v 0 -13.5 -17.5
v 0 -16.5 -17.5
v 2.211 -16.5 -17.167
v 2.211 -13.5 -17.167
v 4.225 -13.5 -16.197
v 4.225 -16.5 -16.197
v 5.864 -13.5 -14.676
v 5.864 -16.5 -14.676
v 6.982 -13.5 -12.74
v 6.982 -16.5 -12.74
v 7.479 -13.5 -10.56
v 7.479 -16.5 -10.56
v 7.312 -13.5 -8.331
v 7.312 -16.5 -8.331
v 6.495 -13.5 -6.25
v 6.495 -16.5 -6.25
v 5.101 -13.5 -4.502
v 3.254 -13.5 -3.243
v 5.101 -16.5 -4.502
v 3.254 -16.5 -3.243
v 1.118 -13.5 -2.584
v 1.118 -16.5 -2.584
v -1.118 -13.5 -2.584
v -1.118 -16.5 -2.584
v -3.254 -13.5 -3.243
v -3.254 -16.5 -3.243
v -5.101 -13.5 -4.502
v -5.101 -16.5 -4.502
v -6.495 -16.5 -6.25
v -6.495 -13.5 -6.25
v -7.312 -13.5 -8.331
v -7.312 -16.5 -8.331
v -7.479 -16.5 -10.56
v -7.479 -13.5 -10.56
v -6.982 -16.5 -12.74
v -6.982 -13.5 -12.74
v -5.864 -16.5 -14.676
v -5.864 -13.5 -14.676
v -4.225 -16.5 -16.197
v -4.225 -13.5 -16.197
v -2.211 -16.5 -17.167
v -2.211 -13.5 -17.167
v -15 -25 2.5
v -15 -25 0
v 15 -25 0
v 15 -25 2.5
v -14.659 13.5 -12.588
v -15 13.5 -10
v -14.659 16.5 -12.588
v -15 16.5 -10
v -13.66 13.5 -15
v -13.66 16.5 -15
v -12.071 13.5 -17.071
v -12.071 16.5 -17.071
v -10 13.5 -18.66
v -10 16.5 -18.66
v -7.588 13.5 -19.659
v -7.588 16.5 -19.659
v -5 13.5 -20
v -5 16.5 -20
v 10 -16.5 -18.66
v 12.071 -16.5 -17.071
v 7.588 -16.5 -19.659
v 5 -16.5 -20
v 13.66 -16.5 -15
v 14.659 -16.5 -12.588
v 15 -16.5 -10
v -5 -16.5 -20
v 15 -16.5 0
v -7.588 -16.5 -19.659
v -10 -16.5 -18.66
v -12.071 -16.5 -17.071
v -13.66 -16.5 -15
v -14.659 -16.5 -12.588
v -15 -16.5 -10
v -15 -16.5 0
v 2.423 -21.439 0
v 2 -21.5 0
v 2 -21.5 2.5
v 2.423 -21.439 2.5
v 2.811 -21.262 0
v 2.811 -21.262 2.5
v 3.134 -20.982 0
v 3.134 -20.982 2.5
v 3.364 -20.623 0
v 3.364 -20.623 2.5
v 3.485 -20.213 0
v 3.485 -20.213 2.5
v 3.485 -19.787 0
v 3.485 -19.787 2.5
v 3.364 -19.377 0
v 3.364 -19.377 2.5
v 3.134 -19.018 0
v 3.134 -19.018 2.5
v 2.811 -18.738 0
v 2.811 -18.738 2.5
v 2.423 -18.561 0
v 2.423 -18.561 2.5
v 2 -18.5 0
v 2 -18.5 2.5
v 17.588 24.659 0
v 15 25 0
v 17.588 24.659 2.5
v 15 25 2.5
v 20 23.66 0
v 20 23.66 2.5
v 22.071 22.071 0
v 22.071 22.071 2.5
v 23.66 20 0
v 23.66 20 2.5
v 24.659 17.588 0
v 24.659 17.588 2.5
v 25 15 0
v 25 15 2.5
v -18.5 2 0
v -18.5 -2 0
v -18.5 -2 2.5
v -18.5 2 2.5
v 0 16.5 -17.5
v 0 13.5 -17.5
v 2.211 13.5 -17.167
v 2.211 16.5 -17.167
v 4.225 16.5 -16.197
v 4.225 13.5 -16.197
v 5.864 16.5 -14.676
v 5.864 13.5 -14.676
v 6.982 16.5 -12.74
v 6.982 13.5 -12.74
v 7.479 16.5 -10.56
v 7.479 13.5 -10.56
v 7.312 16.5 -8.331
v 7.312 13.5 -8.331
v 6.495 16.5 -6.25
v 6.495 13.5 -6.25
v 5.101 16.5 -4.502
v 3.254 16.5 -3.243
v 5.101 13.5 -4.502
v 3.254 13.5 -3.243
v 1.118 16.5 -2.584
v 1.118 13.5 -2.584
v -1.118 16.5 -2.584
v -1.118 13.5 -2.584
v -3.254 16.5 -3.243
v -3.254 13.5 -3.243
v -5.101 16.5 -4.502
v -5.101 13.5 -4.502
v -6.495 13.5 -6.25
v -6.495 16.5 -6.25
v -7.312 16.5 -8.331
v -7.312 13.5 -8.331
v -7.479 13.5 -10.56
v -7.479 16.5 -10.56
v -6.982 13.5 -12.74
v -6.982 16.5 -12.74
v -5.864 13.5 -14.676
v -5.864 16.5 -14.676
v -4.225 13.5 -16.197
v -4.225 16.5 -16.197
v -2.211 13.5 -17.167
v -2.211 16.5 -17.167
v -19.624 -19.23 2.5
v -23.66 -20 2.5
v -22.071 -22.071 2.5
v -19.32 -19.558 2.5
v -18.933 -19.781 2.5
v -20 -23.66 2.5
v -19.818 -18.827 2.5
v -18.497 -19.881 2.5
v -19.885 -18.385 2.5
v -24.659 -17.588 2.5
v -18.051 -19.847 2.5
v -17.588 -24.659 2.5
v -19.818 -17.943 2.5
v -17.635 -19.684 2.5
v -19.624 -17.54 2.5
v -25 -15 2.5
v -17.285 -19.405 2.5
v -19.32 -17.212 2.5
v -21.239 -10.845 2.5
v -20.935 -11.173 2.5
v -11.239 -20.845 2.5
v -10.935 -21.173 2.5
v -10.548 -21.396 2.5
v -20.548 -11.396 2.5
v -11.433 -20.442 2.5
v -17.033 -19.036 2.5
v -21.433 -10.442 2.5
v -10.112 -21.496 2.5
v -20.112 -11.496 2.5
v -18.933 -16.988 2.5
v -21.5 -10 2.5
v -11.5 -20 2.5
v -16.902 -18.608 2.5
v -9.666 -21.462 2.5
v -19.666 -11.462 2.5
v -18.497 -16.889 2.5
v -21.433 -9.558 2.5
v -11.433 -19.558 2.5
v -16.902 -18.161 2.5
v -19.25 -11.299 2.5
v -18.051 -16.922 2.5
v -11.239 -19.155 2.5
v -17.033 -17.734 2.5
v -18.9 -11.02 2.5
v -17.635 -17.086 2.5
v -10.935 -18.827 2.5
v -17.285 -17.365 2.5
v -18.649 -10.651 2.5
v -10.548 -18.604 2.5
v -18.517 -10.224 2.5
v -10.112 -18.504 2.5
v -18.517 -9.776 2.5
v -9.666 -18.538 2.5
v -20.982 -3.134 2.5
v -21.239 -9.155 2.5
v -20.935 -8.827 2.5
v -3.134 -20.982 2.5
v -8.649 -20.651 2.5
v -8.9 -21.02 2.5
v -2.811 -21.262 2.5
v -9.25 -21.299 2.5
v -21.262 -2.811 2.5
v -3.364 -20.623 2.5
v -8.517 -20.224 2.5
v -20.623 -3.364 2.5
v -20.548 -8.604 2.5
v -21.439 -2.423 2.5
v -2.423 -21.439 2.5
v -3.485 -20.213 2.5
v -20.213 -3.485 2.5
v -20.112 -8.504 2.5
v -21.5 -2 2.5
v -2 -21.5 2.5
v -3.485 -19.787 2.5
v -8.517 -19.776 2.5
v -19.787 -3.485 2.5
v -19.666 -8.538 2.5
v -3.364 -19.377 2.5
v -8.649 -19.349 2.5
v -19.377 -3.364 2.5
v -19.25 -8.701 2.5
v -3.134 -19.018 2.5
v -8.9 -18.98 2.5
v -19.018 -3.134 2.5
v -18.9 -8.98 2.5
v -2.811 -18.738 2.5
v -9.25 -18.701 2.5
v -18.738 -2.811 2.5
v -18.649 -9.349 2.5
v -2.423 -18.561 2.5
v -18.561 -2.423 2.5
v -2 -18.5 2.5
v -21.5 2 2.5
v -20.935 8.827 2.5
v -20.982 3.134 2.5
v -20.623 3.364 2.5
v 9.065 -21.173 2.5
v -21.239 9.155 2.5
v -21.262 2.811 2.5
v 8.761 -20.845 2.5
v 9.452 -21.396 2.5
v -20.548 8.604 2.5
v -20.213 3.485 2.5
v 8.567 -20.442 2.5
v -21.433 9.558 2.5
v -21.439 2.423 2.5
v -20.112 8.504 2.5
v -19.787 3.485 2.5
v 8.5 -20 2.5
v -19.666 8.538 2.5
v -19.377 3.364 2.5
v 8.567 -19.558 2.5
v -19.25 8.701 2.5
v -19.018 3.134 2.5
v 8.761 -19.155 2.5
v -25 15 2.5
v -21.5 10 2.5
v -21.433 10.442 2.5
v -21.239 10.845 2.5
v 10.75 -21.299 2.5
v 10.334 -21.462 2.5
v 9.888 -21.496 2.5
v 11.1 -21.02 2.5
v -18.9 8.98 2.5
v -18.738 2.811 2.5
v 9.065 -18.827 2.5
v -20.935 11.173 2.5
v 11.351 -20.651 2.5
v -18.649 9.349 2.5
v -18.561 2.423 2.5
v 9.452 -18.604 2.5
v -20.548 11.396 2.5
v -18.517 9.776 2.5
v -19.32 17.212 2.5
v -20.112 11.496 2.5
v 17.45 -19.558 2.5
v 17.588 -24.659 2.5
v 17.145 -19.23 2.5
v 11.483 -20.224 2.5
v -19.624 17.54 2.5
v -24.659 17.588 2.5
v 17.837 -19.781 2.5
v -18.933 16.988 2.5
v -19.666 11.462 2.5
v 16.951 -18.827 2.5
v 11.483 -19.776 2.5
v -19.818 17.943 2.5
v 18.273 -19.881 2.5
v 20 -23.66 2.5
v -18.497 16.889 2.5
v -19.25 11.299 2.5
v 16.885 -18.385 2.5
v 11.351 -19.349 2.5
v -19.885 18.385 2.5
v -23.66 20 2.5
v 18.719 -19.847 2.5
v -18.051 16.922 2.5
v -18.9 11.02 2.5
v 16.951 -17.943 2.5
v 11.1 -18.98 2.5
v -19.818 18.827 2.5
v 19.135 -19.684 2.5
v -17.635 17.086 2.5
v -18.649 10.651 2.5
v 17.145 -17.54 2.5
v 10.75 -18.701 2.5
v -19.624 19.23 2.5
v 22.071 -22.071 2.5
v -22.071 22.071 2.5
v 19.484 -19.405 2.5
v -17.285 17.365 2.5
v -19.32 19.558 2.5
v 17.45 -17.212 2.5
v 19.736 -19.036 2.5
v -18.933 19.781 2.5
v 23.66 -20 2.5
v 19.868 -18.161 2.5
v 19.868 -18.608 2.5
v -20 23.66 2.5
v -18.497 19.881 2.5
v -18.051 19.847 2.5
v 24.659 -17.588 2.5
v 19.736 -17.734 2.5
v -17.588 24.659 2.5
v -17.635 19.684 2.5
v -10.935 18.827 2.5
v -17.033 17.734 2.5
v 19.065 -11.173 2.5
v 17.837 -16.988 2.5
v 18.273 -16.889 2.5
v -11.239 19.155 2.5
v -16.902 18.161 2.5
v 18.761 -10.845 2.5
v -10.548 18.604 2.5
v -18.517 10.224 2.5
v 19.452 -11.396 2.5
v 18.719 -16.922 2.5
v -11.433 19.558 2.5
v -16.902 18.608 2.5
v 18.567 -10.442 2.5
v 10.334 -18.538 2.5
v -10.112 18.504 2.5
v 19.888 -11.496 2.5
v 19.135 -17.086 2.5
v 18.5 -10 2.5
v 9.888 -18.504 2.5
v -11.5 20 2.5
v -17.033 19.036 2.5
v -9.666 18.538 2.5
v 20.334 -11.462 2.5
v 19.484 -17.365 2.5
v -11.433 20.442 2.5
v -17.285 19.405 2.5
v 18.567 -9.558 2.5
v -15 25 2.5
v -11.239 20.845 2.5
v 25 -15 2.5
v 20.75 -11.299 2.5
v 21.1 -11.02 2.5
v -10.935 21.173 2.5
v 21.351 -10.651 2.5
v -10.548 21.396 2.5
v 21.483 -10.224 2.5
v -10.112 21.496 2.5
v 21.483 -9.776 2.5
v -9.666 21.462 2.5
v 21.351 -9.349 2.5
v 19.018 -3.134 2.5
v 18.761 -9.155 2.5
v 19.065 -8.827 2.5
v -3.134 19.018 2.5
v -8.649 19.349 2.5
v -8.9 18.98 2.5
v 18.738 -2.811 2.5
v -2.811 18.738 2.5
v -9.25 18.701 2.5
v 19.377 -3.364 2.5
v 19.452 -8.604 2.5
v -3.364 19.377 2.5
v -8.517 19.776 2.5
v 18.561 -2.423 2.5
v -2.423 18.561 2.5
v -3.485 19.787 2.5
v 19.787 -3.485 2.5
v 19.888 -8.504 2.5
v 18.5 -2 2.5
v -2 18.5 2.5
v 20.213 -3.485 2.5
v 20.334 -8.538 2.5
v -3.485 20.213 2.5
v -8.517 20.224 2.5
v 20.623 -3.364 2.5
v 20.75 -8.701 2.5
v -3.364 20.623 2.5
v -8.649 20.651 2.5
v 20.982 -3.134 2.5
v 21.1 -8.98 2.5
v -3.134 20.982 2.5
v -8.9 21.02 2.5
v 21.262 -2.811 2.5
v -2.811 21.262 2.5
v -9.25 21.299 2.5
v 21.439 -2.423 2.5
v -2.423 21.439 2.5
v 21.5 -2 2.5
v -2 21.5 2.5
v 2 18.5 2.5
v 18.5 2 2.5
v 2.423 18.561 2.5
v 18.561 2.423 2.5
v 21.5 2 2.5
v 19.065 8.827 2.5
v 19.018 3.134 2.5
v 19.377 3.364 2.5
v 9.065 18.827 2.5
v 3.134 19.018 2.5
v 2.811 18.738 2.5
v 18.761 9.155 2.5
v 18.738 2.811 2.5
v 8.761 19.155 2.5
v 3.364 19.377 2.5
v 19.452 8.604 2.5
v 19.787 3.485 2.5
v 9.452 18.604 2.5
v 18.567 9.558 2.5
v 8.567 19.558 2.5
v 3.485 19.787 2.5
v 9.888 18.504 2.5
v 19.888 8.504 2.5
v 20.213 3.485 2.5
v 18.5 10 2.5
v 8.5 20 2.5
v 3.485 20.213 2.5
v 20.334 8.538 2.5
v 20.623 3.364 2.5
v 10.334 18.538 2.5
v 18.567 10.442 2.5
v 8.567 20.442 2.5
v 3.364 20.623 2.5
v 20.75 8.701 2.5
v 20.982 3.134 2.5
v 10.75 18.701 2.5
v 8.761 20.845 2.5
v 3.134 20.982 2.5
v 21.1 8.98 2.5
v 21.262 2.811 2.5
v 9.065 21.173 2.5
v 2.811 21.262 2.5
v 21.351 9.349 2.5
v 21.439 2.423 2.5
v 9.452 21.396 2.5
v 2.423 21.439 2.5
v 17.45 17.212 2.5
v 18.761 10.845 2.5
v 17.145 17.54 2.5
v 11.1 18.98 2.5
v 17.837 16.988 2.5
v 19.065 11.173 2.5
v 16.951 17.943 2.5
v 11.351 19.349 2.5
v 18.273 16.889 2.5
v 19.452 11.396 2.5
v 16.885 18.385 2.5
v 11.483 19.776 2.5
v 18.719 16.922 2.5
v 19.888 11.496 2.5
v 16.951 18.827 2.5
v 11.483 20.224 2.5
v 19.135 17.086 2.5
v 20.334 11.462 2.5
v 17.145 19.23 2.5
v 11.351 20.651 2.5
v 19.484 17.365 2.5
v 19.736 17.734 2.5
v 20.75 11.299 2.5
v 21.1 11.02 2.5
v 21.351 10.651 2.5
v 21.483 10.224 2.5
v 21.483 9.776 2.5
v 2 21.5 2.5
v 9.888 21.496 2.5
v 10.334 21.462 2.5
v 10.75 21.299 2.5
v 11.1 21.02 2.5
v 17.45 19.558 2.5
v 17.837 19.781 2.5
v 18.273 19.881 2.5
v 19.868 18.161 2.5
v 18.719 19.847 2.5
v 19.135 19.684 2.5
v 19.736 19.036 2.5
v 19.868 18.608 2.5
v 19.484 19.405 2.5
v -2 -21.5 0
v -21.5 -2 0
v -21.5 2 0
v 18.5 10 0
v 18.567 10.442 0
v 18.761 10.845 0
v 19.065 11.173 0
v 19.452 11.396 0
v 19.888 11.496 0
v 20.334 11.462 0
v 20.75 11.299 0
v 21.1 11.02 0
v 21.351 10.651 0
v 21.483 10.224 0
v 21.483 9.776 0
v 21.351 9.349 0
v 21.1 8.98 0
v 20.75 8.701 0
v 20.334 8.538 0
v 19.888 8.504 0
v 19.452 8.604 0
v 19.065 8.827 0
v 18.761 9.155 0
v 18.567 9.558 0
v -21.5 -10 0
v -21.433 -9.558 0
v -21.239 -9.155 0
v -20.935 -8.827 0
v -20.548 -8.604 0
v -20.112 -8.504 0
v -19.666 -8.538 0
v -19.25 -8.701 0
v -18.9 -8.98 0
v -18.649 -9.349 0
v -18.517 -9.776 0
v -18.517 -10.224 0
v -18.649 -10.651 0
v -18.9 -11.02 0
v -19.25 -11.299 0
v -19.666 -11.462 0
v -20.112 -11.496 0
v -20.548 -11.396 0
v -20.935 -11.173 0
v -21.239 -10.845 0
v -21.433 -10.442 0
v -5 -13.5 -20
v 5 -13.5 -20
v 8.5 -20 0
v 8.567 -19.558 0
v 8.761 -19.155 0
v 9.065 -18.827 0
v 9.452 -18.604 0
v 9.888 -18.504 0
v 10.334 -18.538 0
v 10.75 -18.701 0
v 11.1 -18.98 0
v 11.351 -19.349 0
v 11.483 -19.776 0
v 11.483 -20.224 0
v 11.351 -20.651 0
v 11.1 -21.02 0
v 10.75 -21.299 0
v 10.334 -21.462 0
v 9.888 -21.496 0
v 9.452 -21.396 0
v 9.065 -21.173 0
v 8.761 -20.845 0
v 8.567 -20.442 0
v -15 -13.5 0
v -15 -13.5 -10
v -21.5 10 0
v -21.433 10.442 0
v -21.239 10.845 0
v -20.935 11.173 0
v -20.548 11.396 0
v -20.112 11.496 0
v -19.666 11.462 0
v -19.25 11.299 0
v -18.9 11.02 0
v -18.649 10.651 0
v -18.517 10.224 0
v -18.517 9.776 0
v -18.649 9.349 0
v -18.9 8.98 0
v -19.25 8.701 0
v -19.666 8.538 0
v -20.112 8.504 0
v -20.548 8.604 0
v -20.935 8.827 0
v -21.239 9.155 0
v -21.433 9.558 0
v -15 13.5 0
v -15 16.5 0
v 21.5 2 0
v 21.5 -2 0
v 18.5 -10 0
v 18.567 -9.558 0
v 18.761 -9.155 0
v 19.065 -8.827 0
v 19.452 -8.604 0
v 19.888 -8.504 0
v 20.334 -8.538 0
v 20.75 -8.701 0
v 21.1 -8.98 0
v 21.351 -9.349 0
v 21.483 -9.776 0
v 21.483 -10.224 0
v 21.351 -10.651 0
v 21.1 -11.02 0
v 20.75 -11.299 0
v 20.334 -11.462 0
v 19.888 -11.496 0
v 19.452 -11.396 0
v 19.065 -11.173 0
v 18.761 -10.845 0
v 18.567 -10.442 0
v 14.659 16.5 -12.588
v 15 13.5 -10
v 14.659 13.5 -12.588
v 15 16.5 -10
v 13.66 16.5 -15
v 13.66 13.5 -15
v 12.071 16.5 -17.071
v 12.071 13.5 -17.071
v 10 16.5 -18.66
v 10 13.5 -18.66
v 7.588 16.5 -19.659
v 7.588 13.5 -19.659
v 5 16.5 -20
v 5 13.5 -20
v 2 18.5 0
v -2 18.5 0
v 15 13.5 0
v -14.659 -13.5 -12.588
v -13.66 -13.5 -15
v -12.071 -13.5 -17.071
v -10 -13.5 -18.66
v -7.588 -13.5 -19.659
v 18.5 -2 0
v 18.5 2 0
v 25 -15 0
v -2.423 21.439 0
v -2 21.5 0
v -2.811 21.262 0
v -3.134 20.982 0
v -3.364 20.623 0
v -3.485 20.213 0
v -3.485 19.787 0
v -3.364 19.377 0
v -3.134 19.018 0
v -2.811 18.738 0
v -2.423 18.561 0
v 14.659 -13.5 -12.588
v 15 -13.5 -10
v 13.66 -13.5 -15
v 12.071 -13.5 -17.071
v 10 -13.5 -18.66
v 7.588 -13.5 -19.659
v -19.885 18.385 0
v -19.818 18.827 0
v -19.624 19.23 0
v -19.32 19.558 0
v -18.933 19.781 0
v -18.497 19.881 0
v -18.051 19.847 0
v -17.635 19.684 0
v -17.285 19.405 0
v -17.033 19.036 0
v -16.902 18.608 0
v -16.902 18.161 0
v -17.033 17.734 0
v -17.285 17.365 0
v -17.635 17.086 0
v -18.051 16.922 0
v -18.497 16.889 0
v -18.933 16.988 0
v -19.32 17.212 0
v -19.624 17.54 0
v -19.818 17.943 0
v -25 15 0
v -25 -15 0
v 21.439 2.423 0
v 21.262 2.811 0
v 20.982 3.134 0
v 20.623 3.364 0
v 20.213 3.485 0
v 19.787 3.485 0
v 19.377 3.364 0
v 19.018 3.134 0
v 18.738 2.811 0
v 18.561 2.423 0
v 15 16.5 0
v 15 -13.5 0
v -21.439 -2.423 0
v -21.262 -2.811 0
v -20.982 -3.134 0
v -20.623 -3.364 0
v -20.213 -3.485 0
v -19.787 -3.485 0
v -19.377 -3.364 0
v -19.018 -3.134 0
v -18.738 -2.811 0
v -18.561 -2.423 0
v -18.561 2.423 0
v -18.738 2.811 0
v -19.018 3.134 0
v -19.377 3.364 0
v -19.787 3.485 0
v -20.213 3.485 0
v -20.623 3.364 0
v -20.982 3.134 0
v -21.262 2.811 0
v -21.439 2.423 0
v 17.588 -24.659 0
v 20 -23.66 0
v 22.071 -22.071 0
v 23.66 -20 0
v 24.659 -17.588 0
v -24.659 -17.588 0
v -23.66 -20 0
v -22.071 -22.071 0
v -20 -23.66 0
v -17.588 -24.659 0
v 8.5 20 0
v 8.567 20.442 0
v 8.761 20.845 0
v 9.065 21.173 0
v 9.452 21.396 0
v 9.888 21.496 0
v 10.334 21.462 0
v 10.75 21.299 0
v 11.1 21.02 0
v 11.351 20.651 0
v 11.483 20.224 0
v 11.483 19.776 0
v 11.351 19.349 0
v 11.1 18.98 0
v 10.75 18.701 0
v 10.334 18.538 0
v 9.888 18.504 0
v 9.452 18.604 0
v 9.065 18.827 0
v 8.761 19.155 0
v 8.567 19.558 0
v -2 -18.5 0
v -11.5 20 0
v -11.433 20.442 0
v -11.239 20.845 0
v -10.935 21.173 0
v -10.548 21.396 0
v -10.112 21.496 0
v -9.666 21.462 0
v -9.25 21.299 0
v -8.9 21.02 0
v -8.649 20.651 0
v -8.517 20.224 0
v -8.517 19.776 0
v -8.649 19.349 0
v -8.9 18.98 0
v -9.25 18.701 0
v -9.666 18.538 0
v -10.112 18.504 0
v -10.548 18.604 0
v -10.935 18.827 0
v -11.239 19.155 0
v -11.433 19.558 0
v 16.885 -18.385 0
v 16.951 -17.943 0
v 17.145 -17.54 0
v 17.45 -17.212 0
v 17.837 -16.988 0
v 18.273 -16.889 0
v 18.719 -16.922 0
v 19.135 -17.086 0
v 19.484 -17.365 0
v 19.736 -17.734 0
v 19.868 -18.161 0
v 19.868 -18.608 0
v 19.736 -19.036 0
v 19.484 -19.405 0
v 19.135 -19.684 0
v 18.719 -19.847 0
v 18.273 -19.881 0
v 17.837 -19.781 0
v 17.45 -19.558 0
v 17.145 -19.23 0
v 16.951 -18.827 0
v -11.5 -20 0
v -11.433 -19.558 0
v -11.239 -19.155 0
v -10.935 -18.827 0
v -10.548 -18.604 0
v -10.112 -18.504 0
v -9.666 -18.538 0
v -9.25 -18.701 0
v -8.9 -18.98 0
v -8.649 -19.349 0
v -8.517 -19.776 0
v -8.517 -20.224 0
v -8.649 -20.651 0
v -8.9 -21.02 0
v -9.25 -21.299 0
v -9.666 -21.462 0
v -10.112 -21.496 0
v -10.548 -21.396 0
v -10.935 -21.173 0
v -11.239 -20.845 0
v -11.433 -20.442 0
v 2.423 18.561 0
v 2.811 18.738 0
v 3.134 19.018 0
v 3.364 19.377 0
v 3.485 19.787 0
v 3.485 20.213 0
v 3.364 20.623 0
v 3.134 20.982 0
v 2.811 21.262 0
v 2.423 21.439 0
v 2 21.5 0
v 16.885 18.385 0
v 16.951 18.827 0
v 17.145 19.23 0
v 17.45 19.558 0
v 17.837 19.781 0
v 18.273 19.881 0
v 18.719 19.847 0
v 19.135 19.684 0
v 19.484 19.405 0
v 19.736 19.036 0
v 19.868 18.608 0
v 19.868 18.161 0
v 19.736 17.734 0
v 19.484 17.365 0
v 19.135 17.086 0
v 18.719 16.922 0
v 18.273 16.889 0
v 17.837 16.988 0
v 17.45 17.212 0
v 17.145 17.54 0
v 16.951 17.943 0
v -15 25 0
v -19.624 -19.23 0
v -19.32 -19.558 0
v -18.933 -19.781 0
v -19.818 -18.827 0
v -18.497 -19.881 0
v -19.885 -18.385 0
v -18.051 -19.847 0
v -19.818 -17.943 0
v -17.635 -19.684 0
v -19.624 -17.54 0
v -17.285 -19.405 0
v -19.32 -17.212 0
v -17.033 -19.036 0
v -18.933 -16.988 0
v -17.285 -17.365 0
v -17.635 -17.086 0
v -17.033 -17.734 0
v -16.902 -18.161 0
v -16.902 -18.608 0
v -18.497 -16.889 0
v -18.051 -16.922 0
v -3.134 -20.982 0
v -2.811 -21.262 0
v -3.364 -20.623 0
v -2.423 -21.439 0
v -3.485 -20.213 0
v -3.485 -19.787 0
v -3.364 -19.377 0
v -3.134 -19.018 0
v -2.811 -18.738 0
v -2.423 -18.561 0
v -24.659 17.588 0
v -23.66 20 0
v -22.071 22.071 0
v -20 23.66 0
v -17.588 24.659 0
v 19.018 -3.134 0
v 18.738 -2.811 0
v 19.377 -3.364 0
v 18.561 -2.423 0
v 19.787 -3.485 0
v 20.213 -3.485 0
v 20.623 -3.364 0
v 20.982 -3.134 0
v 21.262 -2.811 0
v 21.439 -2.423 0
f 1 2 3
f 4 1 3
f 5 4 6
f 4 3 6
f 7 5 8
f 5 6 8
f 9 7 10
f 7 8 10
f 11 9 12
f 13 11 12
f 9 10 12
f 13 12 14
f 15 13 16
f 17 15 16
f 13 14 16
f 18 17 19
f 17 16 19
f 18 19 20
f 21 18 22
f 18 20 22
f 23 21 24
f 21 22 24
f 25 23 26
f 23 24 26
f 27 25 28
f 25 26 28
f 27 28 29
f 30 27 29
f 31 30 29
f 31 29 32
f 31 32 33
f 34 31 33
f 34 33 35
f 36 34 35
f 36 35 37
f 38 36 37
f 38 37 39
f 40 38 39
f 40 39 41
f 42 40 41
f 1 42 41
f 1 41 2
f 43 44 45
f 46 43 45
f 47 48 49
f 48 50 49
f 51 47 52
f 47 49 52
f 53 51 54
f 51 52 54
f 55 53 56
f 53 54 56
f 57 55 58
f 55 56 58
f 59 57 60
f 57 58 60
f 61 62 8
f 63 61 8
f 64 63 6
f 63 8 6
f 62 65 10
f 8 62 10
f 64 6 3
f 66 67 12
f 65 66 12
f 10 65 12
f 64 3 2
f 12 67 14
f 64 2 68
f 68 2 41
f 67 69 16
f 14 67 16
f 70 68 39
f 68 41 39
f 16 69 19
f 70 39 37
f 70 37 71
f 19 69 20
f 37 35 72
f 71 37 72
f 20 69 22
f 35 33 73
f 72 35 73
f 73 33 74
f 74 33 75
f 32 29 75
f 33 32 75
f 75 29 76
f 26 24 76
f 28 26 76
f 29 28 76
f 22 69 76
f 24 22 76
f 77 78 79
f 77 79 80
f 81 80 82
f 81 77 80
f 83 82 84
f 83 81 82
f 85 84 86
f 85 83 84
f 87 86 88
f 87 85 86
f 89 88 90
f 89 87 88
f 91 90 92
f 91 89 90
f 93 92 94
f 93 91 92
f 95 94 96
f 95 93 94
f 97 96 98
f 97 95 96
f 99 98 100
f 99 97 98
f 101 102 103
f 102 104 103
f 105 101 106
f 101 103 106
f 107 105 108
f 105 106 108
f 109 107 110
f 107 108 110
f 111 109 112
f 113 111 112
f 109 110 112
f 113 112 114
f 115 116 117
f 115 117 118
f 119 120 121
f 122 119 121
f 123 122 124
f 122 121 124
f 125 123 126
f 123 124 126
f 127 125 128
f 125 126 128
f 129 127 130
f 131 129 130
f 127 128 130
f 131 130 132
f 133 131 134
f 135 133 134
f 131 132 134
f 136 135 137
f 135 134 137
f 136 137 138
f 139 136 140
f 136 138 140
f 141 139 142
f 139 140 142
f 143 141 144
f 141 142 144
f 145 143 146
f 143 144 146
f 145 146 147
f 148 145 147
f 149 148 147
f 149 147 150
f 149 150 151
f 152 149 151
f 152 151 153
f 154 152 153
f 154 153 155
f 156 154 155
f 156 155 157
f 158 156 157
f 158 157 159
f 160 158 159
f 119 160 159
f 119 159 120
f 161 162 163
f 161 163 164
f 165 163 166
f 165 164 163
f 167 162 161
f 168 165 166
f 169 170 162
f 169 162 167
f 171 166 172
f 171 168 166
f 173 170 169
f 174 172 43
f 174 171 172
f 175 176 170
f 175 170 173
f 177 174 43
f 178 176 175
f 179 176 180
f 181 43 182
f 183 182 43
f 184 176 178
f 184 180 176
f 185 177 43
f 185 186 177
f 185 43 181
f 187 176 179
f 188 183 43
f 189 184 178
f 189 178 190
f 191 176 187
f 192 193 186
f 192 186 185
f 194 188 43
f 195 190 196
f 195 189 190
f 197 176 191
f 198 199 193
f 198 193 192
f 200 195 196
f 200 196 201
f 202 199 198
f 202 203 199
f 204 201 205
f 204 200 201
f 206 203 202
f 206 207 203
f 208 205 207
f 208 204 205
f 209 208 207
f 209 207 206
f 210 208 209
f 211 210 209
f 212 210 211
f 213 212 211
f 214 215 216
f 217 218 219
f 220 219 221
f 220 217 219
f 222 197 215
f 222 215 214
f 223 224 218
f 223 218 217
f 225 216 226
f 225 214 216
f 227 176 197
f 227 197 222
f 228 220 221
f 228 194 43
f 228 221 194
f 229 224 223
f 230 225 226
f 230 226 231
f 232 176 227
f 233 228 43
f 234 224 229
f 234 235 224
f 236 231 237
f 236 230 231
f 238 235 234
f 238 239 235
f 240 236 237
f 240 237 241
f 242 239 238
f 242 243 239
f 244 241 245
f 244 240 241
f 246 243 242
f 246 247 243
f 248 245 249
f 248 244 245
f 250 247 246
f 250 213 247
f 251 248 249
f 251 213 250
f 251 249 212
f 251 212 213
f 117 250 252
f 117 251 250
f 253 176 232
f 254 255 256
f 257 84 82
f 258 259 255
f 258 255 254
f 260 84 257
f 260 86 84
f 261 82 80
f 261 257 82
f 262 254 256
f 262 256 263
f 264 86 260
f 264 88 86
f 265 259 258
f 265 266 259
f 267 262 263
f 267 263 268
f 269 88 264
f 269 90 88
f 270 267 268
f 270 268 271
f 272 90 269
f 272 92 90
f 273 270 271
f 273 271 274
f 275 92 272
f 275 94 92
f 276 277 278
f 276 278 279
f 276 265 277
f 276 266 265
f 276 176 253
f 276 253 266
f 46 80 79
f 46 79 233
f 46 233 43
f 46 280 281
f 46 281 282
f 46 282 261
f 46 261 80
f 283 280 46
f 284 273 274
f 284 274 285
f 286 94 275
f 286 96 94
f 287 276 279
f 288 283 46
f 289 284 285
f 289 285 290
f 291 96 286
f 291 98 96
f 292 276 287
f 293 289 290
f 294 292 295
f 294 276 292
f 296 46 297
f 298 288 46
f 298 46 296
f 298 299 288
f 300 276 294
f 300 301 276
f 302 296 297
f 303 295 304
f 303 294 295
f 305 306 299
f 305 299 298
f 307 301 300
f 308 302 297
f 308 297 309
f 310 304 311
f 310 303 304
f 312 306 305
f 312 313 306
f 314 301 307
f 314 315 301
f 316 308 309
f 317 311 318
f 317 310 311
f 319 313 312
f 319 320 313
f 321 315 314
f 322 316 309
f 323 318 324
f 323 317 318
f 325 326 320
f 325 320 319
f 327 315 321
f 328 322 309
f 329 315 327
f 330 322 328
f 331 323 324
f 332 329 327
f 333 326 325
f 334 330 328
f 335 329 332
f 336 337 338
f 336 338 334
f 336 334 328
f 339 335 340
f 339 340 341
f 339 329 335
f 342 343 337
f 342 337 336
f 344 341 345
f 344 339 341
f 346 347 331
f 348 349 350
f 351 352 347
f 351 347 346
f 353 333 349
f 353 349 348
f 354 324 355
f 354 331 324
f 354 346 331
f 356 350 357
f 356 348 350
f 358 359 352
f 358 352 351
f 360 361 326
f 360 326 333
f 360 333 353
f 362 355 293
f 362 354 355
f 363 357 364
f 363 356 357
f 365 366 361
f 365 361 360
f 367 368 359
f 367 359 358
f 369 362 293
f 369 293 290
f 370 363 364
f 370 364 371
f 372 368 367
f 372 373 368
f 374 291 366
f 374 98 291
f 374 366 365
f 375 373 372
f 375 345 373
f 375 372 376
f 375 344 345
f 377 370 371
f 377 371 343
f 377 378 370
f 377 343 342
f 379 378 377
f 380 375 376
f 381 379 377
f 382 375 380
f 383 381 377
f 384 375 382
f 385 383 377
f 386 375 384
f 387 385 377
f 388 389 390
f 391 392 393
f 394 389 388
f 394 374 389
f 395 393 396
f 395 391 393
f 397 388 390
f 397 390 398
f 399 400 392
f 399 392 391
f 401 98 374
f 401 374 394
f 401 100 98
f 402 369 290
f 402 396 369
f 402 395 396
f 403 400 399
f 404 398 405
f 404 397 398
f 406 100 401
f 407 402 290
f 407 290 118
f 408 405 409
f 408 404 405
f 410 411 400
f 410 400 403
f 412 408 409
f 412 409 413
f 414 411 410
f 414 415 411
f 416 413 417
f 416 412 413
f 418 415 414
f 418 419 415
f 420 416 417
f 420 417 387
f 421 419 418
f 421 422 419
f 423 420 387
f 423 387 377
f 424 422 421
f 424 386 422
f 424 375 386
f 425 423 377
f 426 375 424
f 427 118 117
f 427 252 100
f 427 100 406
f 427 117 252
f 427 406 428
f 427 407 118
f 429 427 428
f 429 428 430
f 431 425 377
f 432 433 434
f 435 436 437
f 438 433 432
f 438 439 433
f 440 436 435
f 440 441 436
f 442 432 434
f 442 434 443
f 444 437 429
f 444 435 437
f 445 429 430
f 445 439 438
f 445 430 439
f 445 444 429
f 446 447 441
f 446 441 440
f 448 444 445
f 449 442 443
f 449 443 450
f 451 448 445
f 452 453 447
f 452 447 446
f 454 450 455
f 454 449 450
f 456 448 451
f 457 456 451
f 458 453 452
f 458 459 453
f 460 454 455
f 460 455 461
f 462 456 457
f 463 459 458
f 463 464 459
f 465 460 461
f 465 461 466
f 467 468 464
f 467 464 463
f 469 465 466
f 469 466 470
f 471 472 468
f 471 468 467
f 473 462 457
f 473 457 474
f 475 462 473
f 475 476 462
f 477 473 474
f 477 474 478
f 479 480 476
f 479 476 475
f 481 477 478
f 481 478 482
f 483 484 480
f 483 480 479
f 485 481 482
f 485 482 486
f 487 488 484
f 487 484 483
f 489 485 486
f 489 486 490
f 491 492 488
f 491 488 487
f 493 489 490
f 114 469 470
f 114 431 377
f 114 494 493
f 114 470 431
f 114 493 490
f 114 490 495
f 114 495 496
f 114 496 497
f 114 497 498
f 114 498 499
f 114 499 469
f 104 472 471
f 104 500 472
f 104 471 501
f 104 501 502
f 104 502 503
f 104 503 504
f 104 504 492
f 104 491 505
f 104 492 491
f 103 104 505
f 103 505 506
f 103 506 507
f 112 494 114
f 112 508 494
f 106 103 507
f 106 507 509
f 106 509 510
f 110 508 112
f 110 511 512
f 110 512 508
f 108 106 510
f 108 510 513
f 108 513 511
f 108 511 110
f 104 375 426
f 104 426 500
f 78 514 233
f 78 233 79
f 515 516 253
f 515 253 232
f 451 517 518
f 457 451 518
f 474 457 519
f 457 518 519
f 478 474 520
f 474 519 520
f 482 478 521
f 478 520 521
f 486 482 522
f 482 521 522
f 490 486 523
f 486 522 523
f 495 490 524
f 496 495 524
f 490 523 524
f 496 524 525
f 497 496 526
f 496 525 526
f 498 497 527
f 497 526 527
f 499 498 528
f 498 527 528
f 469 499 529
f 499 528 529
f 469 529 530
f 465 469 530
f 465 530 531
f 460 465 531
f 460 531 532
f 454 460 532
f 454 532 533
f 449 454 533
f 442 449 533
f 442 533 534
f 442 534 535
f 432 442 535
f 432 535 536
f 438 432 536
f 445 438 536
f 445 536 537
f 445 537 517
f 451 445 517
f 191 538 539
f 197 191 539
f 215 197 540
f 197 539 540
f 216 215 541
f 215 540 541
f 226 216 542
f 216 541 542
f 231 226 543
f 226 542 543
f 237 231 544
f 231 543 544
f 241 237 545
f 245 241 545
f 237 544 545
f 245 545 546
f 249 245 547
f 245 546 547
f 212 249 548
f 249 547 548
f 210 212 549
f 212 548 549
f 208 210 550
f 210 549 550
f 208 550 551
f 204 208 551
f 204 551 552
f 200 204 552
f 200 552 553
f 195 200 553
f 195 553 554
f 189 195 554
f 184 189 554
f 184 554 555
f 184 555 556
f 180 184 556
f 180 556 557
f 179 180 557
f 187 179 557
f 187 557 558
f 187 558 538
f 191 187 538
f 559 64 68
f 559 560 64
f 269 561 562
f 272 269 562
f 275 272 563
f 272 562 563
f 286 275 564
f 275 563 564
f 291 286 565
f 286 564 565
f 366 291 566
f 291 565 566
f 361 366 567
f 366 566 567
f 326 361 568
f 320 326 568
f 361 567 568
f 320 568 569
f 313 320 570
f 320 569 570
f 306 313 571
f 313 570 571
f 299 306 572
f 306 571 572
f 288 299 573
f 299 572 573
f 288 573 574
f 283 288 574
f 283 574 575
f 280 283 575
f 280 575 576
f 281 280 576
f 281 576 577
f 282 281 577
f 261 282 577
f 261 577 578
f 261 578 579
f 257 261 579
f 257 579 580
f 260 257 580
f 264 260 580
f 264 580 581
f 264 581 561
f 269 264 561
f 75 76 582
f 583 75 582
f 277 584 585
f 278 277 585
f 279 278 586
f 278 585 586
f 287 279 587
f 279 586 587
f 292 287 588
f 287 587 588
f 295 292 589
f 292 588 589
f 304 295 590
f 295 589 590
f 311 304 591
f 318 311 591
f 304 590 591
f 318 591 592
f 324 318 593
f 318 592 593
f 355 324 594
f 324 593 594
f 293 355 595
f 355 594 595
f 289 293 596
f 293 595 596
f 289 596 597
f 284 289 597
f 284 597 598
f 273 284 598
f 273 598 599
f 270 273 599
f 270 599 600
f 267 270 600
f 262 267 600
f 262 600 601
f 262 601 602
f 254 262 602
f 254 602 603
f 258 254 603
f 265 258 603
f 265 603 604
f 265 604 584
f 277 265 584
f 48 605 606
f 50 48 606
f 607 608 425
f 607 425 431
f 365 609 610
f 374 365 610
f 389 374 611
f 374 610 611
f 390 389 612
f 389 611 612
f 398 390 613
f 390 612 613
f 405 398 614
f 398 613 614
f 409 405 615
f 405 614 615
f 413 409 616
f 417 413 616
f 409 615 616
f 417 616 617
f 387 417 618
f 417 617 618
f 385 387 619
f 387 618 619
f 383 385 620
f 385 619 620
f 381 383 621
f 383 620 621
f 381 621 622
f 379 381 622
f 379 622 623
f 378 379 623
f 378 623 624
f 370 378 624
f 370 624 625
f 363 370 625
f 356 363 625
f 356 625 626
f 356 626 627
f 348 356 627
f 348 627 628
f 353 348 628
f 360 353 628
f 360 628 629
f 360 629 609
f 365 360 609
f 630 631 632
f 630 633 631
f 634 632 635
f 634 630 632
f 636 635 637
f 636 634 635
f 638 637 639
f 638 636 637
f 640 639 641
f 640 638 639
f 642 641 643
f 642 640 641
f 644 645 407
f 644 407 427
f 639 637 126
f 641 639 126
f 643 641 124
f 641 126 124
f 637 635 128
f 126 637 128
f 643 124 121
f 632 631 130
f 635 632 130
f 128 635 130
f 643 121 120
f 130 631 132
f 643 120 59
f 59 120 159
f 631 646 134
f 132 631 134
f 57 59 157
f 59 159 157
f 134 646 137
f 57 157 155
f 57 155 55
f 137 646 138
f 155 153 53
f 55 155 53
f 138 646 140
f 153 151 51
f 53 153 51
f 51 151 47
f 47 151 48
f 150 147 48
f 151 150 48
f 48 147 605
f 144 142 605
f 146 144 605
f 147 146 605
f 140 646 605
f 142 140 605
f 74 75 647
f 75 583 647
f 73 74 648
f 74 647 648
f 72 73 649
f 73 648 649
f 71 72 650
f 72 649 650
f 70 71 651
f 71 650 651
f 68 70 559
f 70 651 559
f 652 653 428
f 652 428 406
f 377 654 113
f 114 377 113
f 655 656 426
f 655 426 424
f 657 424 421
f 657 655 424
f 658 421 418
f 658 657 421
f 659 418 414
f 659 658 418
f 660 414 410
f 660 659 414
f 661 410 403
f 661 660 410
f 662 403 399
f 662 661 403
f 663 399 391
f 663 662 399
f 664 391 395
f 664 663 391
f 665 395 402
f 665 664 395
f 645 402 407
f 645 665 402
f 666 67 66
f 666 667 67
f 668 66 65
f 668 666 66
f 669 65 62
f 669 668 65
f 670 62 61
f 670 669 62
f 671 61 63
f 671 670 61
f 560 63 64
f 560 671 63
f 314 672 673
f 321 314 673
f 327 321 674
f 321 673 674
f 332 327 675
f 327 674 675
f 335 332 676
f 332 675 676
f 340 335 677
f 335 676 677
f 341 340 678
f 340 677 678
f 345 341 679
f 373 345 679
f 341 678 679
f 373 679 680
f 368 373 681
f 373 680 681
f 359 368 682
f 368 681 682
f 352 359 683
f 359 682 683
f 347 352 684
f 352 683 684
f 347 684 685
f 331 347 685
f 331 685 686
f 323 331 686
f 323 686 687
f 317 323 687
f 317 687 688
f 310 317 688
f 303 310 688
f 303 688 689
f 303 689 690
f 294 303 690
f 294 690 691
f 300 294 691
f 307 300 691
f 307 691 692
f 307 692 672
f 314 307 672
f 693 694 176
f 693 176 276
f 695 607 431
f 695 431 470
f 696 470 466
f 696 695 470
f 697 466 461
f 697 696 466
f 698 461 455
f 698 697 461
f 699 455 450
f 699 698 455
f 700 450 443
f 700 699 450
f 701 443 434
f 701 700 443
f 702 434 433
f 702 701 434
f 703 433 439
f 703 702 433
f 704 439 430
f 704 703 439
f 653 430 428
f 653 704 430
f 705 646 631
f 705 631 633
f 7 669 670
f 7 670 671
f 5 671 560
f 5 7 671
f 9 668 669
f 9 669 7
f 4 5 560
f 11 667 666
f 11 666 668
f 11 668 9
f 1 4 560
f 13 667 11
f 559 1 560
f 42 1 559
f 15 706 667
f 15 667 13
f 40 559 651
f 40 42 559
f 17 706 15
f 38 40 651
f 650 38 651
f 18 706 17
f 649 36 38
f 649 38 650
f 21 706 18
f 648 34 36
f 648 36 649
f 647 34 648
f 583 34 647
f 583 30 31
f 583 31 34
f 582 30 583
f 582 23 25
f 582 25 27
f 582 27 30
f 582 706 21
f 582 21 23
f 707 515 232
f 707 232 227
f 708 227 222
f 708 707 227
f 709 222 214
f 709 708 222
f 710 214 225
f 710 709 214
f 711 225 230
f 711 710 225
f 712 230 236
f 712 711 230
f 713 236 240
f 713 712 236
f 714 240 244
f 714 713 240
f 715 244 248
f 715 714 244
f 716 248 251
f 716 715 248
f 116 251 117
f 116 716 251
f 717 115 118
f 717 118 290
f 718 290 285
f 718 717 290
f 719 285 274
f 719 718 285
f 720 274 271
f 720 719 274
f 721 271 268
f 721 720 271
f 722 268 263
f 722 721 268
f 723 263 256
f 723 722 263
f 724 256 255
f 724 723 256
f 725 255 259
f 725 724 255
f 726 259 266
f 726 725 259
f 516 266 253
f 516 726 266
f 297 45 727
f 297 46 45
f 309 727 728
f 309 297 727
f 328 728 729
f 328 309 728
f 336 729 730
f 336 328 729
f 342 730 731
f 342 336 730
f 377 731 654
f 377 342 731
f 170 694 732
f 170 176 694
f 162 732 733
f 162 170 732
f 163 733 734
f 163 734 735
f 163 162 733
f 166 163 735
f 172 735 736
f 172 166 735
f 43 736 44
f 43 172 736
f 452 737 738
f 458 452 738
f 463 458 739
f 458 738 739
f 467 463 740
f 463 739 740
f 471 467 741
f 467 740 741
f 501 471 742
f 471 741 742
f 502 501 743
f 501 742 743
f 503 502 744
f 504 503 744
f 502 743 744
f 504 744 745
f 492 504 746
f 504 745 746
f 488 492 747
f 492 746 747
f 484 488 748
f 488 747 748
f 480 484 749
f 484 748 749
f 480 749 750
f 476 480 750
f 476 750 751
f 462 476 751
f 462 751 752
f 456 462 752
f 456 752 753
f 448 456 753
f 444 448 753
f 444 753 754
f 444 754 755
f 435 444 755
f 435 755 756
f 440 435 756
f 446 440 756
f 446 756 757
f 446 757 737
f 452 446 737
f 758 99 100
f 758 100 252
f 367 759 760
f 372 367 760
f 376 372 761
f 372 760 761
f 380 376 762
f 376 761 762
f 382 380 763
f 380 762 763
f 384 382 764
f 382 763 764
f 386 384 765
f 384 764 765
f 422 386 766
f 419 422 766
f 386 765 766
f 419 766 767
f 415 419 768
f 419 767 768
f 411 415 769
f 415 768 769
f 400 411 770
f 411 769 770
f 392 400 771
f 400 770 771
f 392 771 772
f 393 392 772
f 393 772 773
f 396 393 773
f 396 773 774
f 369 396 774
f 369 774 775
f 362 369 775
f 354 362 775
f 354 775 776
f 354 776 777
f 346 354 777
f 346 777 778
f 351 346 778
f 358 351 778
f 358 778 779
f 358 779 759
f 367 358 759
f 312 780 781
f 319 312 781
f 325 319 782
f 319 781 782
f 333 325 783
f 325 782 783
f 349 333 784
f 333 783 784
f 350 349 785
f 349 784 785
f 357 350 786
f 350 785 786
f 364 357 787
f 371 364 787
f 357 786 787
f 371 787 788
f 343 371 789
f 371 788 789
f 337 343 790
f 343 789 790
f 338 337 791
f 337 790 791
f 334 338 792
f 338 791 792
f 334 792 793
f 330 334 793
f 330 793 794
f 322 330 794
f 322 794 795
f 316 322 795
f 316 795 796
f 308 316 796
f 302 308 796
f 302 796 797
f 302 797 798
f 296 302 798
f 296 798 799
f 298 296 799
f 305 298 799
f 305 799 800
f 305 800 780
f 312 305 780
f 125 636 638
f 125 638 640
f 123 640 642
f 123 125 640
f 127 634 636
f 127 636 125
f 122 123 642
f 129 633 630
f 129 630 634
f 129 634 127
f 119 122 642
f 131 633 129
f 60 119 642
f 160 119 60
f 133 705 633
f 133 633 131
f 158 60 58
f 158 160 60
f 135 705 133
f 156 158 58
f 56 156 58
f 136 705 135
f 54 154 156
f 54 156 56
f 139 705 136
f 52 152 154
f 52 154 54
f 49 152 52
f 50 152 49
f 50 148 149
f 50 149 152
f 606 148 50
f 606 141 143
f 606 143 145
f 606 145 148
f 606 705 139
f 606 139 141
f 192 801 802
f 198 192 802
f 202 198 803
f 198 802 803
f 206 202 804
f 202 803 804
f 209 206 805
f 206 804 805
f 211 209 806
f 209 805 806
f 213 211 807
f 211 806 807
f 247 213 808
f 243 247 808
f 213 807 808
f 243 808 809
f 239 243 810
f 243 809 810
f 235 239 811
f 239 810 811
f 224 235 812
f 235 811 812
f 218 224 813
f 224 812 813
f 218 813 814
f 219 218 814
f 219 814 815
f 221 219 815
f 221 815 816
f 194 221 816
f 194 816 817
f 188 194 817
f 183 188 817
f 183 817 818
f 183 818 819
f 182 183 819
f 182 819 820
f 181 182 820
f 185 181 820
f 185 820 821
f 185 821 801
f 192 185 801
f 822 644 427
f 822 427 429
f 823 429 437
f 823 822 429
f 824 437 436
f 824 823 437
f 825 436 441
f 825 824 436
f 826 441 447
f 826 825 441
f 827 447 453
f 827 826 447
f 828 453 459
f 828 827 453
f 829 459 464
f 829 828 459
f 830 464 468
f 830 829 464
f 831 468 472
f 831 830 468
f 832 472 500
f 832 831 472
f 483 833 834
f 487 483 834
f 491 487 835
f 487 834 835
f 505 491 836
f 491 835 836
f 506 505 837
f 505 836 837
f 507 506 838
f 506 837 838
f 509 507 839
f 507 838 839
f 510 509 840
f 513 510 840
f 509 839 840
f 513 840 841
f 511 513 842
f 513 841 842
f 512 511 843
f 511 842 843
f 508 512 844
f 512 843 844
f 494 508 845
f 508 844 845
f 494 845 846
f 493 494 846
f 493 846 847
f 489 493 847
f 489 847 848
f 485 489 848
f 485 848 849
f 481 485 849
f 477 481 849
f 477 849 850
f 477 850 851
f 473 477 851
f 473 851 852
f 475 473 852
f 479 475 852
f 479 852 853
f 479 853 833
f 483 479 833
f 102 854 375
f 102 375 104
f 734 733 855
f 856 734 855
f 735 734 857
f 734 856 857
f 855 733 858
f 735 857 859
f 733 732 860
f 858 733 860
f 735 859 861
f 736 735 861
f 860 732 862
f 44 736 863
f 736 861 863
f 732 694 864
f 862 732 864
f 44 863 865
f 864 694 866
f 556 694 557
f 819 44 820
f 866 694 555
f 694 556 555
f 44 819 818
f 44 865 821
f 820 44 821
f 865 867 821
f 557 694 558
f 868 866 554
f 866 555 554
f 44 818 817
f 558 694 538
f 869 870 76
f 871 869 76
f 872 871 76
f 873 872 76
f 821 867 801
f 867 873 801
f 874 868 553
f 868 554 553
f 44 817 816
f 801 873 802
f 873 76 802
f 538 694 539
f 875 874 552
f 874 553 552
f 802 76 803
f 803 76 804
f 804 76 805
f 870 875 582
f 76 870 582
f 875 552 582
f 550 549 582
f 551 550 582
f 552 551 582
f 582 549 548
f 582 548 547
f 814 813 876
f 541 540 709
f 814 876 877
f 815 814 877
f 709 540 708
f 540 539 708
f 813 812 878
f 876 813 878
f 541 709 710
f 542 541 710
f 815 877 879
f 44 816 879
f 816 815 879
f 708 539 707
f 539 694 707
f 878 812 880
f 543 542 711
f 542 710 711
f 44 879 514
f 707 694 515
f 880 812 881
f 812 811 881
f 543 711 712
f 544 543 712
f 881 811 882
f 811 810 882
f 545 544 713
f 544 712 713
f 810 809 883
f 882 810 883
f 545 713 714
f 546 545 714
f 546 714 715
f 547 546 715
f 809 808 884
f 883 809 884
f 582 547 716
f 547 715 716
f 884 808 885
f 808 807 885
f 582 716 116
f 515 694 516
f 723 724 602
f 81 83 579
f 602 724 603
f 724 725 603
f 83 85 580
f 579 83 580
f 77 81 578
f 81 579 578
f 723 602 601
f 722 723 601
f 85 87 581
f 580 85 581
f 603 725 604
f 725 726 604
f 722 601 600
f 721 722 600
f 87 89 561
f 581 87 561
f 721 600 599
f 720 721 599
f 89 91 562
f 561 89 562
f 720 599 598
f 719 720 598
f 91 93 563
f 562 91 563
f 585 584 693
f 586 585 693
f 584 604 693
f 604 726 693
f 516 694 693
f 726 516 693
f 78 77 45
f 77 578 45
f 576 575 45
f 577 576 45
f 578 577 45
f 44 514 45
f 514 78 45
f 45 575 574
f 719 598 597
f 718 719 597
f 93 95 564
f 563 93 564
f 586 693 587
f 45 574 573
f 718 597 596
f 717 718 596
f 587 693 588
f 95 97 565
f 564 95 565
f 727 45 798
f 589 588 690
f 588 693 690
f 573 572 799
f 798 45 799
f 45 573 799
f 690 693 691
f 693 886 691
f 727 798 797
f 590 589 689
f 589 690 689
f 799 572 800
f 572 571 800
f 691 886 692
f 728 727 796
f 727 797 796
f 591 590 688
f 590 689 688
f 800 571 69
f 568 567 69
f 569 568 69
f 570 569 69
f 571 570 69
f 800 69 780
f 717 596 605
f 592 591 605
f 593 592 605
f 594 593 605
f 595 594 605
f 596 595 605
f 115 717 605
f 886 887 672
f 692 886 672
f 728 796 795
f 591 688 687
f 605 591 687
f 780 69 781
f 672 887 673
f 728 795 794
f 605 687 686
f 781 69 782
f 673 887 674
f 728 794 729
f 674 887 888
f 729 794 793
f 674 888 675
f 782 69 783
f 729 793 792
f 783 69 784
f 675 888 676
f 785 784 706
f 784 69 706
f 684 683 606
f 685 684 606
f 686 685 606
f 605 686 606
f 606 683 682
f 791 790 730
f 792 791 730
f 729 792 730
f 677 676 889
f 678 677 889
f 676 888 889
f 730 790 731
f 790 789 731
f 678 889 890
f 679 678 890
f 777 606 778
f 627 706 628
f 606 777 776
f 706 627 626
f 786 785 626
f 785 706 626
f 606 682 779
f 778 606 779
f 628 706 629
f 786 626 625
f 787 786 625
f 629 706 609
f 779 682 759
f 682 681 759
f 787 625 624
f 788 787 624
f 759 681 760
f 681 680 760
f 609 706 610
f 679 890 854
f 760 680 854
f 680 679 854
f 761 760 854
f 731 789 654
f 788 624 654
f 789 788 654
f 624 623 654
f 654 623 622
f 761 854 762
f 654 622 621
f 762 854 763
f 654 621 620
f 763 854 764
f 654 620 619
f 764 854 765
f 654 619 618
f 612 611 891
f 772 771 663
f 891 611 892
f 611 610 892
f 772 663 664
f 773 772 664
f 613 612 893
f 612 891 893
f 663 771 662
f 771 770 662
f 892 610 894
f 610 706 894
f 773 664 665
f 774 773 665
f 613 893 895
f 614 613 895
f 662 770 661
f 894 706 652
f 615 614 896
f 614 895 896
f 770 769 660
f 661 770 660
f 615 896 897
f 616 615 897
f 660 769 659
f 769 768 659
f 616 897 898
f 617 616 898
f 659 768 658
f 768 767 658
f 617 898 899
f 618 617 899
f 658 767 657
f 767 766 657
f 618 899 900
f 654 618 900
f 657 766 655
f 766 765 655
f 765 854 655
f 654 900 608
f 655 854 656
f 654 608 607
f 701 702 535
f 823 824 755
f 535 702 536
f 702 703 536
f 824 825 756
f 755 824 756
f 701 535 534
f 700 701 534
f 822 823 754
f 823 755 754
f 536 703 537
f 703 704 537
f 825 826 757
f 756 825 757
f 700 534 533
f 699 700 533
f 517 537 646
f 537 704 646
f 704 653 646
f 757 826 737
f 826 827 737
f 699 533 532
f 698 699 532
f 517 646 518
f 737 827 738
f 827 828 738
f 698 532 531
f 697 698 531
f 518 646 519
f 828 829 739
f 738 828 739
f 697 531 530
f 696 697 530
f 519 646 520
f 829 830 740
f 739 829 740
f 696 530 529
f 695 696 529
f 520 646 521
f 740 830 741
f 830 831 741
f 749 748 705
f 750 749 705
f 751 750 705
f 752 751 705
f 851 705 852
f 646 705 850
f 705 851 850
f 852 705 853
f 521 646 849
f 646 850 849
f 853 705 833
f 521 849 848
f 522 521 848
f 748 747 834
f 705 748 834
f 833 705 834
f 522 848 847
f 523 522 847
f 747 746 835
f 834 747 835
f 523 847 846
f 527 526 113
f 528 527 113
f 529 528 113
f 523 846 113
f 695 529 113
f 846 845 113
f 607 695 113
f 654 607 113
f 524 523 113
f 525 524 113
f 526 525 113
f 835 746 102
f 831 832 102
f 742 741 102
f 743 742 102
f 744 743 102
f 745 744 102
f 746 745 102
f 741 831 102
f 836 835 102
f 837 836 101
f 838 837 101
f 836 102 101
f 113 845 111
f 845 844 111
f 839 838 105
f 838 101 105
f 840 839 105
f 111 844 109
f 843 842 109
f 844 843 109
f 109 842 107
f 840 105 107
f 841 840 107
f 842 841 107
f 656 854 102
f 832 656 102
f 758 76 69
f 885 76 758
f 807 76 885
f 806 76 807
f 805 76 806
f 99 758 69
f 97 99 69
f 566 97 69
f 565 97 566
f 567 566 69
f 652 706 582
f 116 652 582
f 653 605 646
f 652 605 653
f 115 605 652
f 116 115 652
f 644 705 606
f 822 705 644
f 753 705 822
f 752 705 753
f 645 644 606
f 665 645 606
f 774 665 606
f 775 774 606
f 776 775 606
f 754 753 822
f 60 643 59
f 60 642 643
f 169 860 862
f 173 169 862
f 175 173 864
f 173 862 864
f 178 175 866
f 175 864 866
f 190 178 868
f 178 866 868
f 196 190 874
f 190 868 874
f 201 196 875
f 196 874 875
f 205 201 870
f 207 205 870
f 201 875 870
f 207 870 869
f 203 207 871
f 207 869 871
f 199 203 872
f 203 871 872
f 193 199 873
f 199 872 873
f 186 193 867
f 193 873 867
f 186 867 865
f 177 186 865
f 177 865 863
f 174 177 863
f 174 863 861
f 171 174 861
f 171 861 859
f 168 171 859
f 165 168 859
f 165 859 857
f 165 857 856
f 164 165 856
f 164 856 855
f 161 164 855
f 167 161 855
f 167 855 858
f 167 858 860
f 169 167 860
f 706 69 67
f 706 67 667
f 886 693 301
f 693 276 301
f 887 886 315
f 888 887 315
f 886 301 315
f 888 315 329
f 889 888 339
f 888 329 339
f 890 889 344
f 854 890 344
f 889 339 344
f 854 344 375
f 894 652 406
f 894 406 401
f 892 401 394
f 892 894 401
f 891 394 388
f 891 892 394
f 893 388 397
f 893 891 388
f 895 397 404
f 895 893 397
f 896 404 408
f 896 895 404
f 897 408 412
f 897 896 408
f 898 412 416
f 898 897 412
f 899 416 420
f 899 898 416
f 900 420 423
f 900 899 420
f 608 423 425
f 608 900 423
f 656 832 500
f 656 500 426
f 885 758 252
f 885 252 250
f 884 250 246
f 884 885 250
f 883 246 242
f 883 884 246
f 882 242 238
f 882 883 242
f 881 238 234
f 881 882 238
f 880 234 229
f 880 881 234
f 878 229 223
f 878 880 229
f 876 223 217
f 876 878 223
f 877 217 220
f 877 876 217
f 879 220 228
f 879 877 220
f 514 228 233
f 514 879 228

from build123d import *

# Parameters (mm, degrees)
SKETCH1_W           = 50
SKETCH1_H           = 50
BOSS_EXTRUDE1_DEPTH = 2.5
SKETCH2_R           = 1.5
CUT_EXTRUDE1_DEPTH  = 5
FILLET1_R           = 10
SKETCH3_W           = 30
SKETCH3_H           = 3
BOSS_EXTRUDE2_DEPTH = 20
SKETCH4_R           = 7.5
CUT_EXTRUDE2_DEPTH  = 53.414215629
FILLET2_R           = 10


with BuildPart() as part:
    # Sketch1 → Boss-Extrude1 (new body)
    with BuildSketch(Plane.XY):
        Rectangle(SKETCH1_W, SKETCH1_H)
    extrude(amount=BOSS_EXTRUDE1_DEPTH)

    # Sketch2 → Cut-Extrude1 (cut)
    with BuildSketch(Plane(origin=(0, 0, 0), x_dir=(-1, 0, 0), z_dir=(0, 0, -1))):
        with Locations((18.384776311, 18.384776311)):
            Circle(SKETCH2_R)
        with Locations((18.384776311, -18.384776311)):
            Circle(SKETCH2_R)
        with Locations((-18.384776311, -18.384776311)):
            Circle(SKETCH2_R)
        with Locations((-18.384776311, 18.384776311)):
            Circle(SKETCH2_R)
        with Locations((20, 10)):
            Circle(SKETCH2_R)
        with Locations((20, -10)):
            Circle(SKETCH2_R)
        with Locations((-20, -10)):
            Circle(SKETCH2_R)
        with Locations((-20, 10)):
            Circle(SKETCH2_R)
        with Locations((10, 20)):
            Circle(SKETCH2_R)
        with Locations((-10, 20)):
            Circle(SKETCH2_R)
        with Locations((10, -20)):
            Circle(SKETCH2_R)
        with Locations((-10, -20)):
            Circle(SKETCH2_R)
        with BuildLine():
            Line((-2, 21.5), (2, 21.5))
            ThreePointArc((2, 21.5), (3.5, 20), (2, 18.5))
            Line((2, 18.5), (-2, 18.5))
            ThreePointArc((-2, 18.5), (-3.5, 20), (-2, 21.5))
        make_face()
        with BuildLine():
            Line((21.5, 2), (21.5, -2))
            ThreePointArc((21.5, -2), (20, -3.5), (18.5, -2))
            Line((18.5, -2), (18.5, 2))
            ThreePointArc((18.5, 2), (20, 3.5), (21.5, 2))
        make_face()
        with BuildLine():
            Line((2, -21.5), (-2, -21.5))
            ThreePointArc((-2, -21.5), (-3.5, -20), (-2, -18.5))
            Line((-2, -18.5), (2, -18.5))
            ThreePointArc((2, -18.5), (3.5, -20), (2, -21.5))
        make_face()
        with BuildLine():
            Line((-21.5, -2), (-21.5, 2))
            ThreePointArc((-21.5, 2), (-20, 3.5), (-18.5, 2))
            Line((-18.5, 2), (-18.5, -2))
            ThreePointArc((-18.5, -2), (-20, -3.5), (-21.5, -2))
        make_face()
    extrude(amount=-CUT_EXTRUDE1_DEPTH, mode=Mode.SUBTRACT)

    # Fillet1
    fillet1_edges = [part.edges().sort_by_distance(p)[0] for p in [
        (25, -25, 1.25),
        (-25, -25, 1.25),
        (-25, 25, 1.25),
        (25, 25, 1.25),
    ]]
    fillet(fillet1_edges, radius=FILLET1_R)

    # Sketch3 → Boss-Extrude2 (add)
    with BuildSketch(Plane(origin=(0, 0, 0), x_dir=(-1, 0, 0), z_dir=(0, 0, -1))):
        with Locations((0, 15)):
            Rectangle(SKETCH3_W, SKETCH3_H)
        with Locations((0, -15)):
            Rectangle(SKETCH3_W, SKETCH3_H)
    extrude(amount=BOSS_EXTRUDE2_DEPTH)

    # Sketch4 → Cut-Extrude2 (cut, through all)
    with BuildSketch(Plane.XZ.offset(16.5)):
        with Locations(Location((0, -10, 0), (0, 0, 270))):
            Circle(SKETCH4_R)
    extrude(amount=-CUT_EXTRUDE2_DEPTH, mode=Mode.SUBTRACT)

    # Fillet2
    fillet2_edges = [part.edges().sort_by_distance(p)[0] for p in [
        (-15, 15, -20),
        (15, 15, -20),
        (15, -15, -20),
        (-15, -15, -20),
    ]]
    fillet(fillet2_edges, radius=FILLET2_R)


solid = part.part
